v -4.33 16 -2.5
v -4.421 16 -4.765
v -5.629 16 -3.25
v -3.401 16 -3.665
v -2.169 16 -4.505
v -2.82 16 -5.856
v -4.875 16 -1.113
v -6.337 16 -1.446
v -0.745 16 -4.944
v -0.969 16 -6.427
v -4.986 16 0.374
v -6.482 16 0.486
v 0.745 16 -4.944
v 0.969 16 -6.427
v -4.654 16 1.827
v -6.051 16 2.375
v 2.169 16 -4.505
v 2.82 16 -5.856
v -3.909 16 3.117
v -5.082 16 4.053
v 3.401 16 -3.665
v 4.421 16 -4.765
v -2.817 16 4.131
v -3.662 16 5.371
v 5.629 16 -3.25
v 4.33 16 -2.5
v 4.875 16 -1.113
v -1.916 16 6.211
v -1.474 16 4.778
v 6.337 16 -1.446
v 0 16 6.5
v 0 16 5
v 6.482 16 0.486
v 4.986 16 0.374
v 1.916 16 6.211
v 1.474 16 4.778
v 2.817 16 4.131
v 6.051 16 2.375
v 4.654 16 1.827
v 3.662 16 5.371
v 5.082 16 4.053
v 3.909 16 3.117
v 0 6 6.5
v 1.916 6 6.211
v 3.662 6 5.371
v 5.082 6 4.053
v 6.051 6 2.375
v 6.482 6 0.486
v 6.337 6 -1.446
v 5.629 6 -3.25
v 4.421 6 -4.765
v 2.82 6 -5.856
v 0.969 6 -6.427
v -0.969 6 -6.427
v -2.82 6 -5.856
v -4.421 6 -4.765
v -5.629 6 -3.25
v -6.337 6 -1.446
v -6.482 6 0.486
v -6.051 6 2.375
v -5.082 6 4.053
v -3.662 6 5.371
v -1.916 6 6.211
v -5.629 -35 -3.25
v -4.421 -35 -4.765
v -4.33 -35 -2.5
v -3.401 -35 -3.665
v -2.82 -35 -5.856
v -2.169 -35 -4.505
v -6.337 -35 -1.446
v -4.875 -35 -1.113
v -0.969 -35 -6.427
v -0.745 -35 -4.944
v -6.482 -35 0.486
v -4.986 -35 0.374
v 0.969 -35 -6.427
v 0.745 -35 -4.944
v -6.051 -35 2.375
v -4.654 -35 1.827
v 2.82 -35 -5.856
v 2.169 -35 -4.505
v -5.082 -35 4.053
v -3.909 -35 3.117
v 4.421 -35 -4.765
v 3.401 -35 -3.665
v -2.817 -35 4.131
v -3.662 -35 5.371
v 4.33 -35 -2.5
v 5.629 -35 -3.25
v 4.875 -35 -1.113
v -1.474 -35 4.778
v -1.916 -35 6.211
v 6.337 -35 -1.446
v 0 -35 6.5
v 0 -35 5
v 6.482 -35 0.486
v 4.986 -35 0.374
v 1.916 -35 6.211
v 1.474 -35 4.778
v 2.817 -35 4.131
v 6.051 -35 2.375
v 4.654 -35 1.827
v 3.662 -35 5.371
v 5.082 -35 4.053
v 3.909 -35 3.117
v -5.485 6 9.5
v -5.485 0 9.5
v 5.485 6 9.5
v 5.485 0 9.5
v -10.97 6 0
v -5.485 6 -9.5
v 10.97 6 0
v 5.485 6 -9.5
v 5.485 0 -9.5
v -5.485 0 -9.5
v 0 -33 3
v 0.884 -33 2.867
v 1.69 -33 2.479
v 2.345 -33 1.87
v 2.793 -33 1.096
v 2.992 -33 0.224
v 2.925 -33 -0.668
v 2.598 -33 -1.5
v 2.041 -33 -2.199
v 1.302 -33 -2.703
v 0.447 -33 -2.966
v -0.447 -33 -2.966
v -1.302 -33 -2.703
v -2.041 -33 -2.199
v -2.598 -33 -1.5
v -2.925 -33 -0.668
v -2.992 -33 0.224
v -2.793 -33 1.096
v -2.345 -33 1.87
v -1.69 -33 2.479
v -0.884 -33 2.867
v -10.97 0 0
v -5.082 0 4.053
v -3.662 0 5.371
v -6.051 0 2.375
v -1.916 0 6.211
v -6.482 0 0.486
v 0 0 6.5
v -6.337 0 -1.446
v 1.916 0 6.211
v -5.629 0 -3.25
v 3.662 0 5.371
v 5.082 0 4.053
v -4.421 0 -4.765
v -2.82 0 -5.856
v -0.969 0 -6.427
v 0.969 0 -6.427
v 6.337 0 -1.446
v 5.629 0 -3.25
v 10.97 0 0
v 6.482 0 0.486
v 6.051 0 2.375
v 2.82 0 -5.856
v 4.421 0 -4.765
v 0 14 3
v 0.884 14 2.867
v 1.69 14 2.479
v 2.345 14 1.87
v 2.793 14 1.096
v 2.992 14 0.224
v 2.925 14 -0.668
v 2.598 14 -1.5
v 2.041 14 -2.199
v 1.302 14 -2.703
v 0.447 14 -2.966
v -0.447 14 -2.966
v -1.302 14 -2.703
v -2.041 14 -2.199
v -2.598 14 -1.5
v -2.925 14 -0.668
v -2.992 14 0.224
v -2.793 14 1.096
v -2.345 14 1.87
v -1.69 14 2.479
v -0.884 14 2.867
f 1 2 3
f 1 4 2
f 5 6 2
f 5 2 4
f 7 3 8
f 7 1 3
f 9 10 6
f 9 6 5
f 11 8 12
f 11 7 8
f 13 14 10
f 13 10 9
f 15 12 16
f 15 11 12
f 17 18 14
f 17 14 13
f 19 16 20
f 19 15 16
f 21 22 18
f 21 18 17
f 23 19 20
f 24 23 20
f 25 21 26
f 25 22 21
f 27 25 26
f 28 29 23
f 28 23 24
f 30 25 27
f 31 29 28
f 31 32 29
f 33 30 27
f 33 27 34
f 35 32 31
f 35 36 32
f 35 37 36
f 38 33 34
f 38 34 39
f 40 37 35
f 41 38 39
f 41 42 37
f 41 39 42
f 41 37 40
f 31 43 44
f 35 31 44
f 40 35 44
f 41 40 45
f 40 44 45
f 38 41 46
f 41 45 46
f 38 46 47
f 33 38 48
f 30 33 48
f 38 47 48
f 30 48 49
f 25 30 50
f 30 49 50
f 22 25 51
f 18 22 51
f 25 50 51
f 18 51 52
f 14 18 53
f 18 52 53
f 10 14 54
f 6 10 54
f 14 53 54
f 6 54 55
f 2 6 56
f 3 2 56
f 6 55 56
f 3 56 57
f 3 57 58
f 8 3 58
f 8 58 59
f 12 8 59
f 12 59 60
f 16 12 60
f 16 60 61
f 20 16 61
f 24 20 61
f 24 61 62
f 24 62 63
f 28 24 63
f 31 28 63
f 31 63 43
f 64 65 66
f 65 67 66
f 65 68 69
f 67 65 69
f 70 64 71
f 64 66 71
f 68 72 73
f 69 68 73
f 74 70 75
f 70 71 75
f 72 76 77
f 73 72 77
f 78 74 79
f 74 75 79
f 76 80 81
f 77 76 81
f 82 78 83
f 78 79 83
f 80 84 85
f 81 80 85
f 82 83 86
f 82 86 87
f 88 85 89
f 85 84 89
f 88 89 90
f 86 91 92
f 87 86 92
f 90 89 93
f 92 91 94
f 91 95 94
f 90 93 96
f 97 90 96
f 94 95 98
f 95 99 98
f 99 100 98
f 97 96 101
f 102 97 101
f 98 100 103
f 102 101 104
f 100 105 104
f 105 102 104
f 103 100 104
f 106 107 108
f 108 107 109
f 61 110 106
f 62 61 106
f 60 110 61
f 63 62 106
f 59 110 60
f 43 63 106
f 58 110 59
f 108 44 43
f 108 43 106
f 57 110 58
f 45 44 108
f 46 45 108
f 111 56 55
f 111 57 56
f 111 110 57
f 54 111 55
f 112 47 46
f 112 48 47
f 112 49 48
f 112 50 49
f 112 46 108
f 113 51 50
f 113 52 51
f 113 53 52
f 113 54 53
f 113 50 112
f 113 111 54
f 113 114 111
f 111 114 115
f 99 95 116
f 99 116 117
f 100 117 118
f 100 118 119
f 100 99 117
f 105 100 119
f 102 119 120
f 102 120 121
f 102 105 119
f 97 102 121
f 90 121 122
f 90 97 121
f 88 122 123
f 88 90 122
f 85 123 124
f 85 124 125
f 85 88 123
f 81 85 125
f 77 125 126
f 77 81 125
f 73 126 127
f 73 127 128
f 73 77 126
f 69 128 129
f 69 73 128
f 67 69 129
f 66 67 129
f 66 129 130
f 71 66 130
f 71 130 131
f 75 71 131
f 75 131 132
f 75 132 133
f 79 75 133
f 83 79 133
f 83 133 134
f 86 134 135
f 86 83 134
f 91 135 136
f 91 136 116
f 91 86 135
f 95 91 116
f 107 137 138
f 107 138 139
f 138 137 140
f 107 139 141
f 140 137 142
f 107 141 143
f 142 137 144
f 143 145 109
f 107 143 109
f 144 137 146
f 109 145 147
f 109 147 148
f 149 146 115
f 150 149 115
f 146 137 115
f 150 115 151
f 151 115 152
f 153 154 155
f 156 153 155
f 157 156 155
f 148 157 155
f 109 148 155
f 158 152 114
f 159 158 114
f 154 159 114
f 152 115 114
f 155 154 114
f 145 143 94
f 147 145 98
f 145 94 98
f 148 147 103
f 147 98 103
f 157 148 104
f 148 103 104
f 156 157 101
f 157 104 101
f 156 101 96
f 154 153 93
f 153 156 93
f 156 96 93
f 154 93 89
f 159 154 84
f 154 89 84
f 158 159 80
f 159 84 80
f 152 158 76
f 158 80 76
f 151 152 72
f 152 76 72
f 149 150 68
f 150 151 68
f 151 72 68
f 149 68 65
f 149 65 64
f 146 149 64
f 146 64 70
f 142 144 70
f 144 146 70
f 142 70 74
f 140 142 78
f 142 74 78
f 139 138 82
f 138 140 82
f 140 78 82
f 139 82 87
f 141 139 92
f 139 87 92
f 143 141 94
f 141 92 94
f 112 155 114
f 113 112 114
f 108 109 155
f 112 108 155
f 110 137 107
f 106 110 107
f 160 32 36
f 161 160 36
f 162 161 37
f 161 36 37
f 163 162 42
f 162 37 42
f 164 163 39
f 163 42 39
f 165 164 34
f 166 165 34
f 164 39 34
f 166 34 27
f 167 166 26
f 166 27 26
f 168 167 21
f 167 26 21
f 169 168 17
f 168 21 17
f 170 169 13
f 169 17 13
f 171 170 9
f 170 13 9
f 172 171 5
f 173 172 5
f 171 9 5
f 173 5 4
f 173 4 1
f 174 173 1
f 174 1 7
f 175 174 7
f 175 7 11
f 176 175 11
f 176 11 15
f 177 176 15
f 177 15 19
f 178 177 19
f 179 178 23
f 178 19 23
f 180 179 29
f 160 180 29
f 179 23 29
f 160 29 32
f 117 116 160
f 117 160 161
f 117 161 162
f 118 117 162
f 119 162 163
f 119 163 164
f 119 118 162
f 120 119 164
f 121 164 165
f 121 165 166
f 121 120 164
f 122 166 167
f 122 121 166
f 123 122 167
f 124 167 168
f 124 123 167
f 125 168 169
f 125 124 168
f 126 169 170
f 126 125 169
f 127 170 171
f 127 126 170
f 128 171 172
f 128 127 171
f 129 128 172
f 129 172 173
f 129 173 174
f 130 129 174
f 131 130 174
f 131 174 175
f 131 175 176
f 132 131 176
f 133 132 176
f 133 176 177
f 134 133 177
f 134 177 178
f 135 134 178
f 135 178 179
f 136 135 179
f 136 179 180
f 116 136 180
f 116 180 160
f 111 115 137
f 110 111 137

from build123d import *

# Parameters (mm, degrees)
SZKIC1_R                         = 6.5
DODANIE_WYCI_GNI_CIE1_DEPTH      = 6
SZKIC1_3_R                       = 6.5
SZKIC1_3_R_2                     = 3
DODANIE_WYCI_GNI_CIE2_DEPTH      = 16
DODANIE_WYCI_GNI_CIE3_DEPTH      = 16
DODANIE_WYCI_GNI_CIE3_DEPTH_BACK = 35
SZKIC1_4_R                       = 6.5
SZKIC1_4_R_2                     = 3
SFAZOWANIE1_SIZE                 = 2
SFAZOWANIE2_SIZE                 = 2


with BuildPart() as part:
    # Szkic1 → Dodanie-wyciągnięcie1 (new body)
    with BuildSketch(Plane(origin=(0, 0, 0), x_dir=(1, 0, 0), z_dir=(0, 1, 0))):
        Polygon((-5.484827557, 9.5), (-10.969655115, 0), (-5.484827557, -9.5), (5.484827557, -9.5), (10.969655115, 0), (5.484827557, 9.5), align=None)
        Circle(SZKIC1_R, mode=Mode.SUBTRACT)
    extrude(amount=DODANIE_WYCI_GNI_CIE1_DEPTH)

    # Szkic1<3> → Dodanie-wyciągnięcie2 (add)
    with BuildSketch(Plane(origin=(0, 0, 0), x_dir=(1, 0, 0), z_dir=(0, 1, 0))):
        Circle(SZKIC1_3_R)
        Circle(SZKIC1_3_R_2, mode=Mode.SUBTRACT)
    extrude(amount=DODANIE_WYCI_GNI_CIE2_DEPTH)

    # Szkic1<4> → Dodanie-wyciągnięcie3 (add, two sides: drawn at the far end of the back side and taken through both)
    with BuildSketch(Plane(origin=(0, 0, 0), x_dir=(1, 0, 0), z_dir=(0, 1, 0)).offset(-DODANIE_WYCI_GNI_CIE3_DEPTH_BACK)):
        Circle(SZKIC1_4_R)
        Circle(SZKIC1_4_R_2, mode=Mode.SUBTRACT)
    extrude(amount=DODANIE_WYCI_GNI_CIE3_DEPTH + DODANIE_WYCI_GNI_CIE3_DEPTH_BACK)

    # Sfazowanie1
    sfazowanie1_edges = [part.edges().sort_by_distance(p)[0] for p in [
        (-3, 16, 0),
    ]]
    chamfer(sfazowanie1_edges, length=SFAZOWANIE1_SIZE)

    # Sfazowanie2
    sfazowanie2_edges = [part.edges().sort_by_distance(p)[0] for p in [
        (-3, -35, 0),
    ]]
    chamfer(sfazowanie2_edges, length=SFAZOWANIE2_SIZE)


solid = part.part
